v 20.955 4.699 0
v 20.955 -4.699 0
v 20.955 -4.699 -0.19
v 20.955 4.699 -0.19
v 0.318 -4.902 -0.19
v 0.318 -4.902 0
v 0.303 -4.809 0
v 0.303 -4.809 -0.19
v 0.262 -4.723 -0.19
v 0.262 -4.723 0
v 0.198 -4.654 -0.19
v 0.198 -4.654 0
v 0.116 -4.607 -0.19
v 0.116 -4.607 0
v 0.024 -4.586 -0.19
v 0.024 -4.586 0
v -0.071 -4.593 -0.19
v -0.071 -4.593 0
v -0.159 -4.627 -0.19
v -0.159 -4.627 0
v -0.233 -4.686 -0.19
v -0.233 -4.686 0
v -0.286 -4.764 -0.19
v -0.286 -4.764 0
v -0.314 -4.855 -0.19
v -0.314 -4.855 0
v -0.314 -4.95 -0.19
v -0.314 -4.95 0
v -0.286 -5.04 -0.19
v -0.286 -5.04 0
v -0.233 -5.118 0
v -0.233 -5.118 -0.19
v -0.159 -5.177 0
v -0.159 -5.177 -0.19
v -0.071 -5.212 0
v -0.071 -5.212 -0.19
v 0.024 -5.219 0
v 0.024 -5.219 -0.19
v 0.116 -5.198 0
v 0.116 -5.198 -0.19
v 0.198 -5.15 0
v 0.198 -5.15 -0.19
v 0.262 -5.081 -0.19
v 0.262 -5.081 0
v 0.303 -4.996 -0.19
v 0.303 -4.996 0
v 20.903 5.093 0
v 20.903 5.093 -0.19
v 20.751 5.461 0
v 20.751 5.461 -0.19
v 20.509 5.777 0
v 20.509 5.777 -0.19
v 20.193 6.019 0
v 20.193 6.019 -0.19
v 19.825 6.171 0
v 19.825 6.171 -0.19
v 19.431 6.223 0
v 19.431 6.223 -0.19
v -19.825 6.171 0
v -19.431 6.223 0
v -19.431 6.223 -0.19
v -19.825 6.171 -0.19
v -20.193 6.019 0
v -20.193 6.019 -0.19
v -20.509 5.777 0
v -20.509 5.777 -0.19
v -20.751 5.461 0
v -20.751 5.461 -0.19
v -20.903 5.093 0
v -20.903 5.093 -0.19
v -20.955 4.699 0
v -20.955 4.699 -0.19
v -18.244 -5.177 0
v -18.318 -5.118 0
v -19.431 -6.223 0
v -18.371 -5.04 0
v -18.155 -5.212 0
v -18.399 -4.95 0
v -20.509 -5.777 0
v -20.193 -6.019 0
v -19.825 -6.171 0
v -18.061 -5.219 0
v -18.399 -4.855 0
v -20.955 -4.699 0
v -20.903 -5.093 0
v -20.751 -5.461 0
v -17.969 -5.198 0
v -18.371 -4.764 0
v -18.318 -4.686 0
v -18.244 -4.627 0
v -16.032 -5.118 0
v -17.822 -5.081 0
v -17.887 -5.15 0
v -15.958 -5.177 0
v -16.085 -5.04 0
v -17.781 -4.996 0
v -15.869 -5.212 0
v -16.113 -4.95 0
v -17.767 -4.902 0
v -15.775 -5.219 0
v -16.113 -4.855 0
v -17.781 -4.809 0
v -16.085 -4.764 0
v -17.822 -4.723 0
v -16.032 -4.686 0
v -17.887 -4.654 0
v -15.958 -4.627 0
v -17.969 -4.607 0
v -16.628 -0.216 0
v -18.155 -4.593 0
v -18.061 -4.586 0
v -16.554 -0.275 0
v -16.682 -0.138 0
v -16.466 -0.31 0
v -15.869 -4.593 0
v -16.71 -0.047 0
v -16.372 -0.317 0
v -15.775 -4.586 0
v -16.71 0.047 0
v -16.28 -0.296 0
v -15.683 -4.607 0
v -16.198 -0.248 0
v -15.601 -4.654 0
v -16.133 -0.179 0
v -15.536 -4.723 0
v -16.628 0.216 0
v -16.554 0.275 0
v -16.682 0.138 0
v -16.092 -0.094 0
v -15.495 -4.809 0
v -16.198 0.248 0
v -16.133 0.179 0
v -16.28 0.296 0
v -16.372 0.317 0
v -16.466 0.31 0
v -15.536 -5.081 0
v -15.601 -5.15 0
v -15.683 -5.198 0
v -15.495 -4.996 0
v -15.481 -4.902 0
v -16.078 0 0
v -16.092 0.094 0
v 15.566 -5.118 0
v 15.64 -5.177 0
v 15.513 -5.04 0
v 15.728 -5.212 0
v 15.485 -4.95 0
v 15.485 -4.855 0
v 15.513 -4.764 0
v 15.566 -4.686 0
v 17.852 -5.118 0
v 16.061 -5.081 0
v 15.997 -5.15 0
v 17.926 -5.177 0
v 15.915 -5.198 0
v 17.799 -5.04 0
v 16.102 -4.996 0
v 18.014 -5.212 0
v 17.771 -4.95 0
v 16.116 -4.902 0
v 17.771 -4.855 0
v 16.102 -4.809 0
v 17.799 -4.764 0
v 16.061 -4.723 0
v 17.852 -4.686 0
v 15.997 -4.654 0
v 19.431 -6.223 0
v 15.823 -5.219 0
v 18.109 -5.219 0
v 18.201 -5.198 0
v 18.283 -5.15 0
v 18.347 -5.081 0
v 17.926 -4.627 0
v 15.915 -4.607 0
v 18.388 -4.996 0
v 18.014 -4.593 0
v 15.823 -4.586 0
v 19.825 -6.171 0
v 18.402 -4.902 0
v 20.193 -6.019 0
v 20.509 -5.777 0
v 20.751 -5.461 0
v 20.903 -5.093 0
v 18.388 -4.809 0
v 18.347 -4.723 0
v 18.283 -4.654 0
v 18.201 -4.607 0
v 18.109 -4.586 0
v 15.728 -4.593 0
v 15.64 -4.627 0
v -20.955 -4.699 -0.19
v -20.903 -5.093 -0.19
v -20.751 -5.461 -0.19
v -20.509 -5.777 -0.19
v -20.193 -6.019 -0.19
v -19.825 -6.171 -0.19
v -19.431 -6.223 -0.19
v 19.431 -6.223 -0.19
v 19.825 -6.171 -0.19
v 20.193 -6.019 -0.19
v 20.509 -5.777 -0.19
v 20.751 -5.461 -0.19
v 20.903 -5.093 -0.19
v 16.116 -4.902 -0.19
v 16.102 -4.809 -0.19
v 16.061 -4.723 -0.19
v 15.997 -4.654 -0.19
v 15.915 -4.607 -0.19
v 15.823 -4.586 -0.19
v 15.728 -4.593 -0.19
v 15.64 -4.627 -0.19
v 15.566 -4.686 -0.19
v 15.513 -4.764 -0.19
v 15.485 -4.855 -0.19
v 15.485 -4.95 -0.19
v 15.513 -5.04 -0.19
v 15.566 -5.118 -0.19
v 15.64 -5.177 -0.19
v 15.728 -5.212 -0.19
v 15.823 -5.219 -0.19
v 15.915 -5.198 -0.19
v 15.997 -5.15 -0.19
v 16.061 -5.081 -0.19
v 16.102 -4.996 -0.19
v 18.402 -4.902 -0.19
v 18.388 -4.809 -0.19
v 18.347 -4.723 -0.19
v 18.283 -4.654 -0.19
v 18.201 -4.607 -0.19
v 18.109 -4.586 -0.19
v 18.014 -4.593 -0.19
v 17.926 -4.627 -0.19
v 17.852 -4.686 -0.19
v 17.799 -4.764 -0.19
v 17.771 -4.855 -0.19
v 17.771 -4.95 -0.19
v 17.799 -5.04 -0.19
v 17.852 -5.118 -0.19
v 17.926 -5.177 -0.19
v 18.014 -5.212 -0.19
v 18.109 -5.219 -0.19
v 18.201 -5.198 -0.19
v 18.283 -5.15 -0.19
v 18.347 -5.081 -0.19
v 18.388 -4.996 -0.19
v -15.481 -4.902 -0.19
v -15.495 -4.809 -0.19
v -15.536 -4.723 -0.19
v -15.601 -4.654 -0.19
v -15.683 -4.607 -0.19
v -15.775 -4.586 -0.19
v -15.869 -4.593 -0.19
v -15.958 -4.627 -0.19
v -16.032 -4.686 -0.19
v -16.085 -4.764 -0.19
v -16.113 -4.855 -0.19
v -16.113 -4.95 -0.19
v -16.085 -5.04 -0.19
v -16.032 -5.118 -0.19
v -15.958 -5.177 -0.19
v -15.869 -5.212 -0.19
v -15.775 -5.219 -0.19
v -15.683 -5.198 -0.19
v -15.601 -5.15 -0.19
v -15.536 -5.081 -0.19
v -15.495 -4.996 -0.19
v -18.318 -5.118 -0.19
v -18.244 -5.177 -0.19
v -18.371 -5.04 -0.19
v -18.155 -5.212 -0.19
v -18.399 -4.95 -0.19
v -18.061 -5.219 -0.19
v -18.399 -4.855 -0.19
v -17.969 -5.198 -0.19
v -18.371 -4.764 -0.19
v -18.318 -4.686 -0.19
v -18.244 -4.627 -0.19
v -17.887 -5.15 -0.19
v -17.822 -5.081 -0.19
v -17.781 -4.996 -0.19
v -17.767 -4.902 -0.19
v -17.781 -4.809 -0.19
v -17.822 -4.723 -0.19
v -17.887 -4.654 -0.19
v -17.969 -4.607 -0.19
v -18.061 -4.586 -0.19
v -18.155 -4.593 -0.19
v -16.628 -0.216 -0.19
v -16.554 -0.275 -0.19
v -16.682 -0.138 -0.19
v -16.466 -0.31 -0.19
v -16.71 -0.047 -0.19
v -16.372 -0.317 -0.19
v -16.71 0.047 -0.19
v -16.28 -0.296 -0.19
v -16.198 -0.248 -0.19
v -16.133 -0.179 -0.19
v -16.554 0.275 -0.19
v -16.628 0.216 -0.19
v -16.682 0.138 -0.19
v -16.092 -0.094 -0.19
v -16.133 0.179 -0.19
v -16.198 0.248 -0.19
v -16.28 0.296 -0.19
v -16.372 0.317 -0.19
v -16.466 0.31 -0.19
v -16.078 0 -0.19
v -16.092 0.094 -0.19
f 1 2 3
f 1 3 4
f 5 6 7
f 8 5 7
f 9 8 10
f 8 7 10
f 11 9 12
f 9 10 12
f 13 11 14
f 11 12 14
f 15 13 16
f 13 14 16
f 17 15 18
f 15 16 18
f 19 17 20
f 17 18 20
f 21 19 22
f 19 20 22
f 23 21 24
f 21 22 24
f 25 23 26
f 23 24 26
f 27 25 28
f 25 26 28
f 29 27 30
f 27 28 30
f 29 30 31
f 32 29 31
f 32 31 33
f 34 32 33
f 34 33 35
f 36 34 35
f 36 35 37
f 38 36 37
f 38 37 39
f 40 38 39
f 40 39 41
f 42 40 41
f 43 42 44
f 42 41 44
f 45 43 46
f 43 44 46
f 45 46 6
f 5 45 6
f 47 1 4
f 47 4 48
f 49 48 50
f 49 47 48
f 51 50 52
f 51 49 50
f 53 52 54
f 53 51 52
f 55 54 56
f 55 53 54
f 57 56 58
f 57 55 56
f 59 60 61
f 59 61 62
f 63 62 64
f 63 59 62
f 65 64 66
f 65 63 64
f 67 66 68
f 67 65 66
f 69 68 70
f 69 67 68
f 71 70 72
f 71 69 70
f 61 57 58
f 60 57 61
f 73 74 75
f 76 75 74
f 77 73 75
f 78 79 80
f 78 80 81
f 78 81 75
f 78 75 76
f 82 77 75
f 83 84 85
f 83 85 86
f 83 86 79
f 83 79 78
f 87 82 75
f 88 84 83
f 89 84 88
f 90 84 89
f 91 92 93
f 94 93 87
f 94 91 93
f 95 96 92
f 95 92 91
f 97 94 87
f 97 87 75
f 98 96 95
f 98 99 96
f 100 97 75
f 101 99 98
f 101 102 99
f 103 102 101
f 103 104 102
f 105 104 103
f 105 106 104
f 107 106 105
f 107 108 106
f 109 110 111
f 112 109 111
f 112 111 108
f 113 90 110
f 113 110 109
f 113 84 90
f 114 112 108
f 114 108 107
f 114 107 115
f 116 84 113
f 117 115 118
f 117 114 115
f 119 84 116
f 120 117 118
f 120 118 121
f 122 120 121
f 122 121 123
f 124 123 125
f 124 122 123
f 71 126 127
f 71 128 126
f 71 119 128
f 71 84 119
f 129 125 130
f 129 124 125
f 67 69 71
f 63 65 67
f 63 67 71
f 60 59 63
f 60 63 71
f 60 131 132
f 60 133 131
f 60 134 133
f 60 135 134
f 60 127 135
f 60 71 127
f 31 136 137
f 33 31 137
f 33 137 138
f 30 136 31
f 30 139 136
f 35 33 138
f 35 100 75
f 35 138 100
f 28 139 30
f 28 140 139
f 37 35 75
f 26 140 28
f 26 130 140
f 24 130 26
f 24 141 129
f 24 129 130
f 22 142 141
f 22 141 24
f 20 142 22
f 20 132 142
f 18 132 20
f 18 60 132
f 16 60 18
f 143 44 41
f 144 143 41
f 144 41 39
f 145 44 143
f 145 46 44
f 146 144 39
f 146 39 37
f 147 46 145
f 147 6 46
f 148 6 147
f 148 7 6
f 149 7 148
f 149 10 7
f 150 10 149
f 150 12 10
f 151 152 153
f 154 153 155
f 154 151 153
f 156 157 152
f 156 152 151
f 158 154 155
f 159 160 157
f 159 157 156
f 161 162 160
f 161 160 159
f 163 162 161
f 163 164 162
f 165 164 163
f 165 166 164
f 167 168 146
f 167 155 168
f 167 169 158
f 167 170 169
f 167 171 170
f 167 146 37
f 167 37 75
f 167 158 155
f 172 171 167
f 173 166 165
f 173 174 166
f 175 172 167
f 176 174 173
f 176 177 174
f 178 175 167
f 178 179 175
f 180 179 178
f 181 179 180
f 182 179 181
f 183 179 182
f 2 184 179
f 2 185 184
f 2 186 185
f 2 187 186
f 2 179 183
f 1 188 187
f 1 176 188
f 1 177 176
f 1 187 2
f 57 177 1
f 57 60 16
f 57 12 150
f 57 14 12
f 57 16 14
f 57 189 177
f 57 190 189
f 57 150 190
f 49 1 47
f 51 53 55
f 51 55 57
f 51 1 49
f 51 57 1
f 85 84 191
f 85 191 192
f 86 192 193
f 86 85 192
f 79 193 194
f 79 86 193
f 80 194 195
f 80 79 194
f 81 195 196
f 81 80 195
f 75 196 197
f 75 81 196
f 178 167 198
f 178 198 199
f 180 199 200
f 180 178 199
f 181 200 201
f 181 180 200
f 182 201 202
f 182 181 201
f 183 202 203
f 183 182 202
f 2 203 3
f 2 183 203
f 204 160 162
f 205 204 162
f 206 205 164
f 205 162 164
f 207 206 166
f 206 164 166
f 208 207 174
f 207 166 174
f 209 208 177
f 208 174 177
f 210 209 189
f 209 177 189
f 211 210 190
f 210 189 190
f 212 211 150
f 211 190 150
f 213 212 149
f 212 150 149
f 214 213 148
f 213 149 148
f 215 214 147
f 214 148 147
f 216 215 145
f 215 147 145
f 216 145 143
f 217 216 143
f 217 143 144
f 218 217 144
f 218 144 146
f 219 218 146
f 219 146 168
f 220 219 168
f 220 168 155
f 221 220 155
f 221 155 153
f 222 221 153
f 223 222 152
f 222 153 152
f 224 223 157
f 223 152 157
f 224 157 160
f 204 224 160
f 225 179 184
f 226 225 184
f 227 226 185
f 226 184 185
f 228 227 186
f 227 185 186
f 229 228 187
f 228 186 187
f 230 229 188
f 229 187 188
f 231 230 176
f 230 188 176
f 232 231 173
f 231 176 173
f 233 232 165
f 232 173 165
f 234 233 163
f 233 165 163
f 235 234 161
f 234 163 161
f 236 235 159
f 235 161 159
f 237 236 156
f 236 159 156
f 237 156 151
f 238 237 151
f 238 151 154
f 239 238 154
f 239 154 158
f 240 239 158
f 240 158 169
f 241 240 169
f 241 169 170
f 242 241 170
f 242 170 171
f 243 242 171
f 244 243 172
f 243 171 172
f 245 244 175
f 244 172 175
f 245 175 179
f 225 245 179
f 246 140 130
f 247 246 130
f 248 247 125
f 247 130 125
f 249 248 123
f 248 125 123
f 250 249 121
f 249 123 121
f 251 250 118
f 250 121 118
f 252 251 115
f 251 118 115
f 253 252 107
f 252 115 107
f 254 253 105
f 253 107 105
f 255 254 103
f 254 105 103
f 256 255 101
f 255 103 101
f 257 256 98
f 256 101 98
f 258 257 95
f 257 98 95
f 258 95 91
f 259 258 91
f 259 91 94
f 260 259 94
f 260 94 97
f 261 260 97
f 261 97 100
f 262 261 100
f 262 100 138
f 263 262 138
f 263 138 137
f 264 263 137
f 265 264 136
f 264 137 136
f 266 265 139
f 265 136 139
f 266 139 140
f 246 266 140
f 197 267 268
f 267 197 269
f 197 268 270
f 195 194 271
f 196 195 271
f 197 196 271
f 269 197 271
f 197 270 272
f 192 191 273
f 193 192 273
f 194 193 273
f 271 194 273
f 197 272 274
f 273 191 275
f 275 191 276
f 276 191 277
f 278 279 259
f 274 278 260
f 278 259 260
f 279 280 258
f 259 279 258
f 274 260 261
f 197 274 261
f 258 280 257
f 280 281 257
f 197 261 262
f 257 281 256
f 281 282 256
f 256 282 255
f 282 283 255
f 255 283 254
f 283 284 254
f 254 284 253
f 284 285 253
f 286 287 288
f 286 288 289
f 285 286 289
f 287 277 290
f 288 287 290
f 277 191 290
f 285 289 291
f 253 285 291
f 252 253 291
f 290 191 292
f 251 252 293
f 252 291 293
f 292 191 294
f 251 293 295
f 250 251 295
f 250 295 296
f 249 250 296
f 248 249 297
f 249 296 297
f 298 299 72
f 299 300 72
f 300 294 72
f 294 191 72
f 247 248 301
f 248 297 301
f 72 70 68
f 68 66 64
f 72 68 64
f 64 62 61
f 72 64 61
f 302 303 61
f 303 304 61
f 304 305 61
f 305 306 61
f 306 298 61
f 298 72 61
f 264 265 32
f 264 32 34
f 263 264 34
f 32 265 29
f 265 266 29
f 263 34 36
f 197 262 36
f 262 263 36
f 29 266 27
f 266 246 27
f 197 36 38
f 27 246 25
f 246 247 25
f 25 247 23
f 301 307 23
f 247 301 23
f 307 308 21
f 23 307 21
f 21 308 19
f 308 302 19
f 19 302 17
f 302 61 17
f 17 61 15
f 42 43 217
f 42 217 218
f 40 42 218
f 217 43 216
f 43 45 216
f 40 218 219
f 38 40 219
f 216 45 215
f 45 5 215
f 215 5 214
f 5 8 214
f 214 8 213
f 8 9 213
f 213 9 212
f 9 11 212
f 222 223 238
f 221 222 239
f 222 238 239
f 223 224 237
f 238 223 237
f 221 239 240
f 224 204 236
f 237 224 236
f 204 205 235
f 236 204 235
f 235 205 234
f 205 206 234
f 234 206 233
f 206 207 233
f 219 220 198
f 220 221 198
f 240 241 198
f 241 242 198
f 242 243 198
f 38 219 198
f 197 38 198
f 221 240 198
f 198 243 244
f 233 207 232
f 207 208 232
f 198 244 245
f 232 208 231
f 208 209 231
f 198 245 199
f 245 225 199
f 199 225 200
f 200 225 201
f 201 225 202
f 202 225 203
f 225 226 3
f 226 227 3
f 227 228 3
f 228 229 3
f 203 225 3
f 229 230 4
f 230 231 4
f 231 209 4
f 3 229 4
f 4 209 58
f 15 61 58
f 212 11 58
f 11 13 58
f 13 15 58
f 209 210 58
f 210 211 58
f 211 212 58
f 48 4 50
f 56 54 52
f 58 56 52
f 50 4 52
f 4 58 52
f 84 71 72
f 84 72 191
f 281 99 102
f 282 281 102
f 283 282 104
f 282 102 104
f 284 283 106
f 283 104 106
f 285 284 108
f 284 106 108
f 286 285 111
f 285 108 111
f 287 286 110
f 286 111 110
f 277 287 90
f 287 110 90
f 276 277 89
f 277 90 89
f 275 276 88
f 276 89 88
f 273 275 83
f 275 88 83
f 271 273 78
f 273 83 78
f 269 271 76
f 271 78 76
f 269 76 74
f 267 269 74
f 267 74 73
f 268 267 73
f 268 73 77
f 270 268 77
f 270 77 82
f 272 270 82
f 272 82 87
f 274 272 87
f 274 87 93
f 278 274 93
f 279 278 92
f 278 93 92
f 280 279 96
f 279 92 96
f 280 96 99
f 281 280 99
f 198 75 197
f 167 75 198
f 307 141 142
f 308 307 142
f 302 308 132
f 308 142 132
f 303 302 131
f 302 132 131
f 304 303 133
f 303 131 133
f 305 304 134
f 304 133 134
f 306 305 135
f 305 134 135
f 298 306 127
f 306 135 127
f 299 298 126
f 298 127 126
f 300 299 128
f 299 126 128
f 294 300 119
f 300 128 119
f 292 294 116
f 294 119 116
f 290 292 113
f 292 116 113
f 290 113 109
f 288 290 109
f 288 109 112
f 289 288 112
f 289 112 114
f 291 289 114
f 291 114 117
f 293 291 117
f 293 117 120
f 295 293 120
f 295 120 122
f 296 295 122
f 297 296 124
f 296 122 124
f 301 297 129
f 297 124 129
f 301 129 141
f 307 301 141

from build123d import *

# Parameters (mm, degrees)
SKETCH1_R           = 0.3175
BOSS_EXTRUDE1_DEPTH = 0.1905


with BuildPart() as part:
    # Sketch1 → Boss-Extrude1 (new body)
    with BuildSketch(Plane.XY):
        with BuildLine():
            Line((19.431, 6.223), (-19.431, 6.223))
            ThreePointArc((-19.431, 6.223), (-20.508630735, 5.776630735), (-20.955, 4.699))
            Line((-20.955, 4.699), (-20.955, -4.699))
            ThreePointArc((-20.955, -4.699), (-20.508630735, -5.776630735), (-19.431, -6.223))
            Line((-19.431, -6.223), (19.431, -6.223))
            ThreePointArc((19.431, -6.223), (20.508630735, -5.776630735), (20.955, -4.699))
            Line((20.955, -4.699), (20.955, 4.699))
            ThreePointArc((20.955, 4.699), (20.508630735, 5.776630735), (19.431, 6.223))
        make_face()
        with Locations((18.0848, -4.9022)):
            Circle(SKETCH1_R, mode=Mode.SUBTRACT)
        with Locations((15.7988, -4.9022)):
            Circle(SKETCH1_R, mode=Mode.SUBTRACT)
        with Locations((0, -4.9022)):
            Circle(SKETCH1_R, mode=Mode.SUBTRACT)
        with Locations((-16.3957, 0)):
            Circle(SKETCH1_R, mode=Mode.SUBTRACT)
        with Locations((-15.7988, -4.9022)):
            Circle(SKETCH1_R, mode=Mode.SUBTRACT)
        with Locations((-18.0848, -4.9022)):
            Circle(SKETCH1_R, mode=Mode.SUBTRACT)
    extrude(amount=-BOSS_EXTRUDE1_DEPTH)


solid = part.part
